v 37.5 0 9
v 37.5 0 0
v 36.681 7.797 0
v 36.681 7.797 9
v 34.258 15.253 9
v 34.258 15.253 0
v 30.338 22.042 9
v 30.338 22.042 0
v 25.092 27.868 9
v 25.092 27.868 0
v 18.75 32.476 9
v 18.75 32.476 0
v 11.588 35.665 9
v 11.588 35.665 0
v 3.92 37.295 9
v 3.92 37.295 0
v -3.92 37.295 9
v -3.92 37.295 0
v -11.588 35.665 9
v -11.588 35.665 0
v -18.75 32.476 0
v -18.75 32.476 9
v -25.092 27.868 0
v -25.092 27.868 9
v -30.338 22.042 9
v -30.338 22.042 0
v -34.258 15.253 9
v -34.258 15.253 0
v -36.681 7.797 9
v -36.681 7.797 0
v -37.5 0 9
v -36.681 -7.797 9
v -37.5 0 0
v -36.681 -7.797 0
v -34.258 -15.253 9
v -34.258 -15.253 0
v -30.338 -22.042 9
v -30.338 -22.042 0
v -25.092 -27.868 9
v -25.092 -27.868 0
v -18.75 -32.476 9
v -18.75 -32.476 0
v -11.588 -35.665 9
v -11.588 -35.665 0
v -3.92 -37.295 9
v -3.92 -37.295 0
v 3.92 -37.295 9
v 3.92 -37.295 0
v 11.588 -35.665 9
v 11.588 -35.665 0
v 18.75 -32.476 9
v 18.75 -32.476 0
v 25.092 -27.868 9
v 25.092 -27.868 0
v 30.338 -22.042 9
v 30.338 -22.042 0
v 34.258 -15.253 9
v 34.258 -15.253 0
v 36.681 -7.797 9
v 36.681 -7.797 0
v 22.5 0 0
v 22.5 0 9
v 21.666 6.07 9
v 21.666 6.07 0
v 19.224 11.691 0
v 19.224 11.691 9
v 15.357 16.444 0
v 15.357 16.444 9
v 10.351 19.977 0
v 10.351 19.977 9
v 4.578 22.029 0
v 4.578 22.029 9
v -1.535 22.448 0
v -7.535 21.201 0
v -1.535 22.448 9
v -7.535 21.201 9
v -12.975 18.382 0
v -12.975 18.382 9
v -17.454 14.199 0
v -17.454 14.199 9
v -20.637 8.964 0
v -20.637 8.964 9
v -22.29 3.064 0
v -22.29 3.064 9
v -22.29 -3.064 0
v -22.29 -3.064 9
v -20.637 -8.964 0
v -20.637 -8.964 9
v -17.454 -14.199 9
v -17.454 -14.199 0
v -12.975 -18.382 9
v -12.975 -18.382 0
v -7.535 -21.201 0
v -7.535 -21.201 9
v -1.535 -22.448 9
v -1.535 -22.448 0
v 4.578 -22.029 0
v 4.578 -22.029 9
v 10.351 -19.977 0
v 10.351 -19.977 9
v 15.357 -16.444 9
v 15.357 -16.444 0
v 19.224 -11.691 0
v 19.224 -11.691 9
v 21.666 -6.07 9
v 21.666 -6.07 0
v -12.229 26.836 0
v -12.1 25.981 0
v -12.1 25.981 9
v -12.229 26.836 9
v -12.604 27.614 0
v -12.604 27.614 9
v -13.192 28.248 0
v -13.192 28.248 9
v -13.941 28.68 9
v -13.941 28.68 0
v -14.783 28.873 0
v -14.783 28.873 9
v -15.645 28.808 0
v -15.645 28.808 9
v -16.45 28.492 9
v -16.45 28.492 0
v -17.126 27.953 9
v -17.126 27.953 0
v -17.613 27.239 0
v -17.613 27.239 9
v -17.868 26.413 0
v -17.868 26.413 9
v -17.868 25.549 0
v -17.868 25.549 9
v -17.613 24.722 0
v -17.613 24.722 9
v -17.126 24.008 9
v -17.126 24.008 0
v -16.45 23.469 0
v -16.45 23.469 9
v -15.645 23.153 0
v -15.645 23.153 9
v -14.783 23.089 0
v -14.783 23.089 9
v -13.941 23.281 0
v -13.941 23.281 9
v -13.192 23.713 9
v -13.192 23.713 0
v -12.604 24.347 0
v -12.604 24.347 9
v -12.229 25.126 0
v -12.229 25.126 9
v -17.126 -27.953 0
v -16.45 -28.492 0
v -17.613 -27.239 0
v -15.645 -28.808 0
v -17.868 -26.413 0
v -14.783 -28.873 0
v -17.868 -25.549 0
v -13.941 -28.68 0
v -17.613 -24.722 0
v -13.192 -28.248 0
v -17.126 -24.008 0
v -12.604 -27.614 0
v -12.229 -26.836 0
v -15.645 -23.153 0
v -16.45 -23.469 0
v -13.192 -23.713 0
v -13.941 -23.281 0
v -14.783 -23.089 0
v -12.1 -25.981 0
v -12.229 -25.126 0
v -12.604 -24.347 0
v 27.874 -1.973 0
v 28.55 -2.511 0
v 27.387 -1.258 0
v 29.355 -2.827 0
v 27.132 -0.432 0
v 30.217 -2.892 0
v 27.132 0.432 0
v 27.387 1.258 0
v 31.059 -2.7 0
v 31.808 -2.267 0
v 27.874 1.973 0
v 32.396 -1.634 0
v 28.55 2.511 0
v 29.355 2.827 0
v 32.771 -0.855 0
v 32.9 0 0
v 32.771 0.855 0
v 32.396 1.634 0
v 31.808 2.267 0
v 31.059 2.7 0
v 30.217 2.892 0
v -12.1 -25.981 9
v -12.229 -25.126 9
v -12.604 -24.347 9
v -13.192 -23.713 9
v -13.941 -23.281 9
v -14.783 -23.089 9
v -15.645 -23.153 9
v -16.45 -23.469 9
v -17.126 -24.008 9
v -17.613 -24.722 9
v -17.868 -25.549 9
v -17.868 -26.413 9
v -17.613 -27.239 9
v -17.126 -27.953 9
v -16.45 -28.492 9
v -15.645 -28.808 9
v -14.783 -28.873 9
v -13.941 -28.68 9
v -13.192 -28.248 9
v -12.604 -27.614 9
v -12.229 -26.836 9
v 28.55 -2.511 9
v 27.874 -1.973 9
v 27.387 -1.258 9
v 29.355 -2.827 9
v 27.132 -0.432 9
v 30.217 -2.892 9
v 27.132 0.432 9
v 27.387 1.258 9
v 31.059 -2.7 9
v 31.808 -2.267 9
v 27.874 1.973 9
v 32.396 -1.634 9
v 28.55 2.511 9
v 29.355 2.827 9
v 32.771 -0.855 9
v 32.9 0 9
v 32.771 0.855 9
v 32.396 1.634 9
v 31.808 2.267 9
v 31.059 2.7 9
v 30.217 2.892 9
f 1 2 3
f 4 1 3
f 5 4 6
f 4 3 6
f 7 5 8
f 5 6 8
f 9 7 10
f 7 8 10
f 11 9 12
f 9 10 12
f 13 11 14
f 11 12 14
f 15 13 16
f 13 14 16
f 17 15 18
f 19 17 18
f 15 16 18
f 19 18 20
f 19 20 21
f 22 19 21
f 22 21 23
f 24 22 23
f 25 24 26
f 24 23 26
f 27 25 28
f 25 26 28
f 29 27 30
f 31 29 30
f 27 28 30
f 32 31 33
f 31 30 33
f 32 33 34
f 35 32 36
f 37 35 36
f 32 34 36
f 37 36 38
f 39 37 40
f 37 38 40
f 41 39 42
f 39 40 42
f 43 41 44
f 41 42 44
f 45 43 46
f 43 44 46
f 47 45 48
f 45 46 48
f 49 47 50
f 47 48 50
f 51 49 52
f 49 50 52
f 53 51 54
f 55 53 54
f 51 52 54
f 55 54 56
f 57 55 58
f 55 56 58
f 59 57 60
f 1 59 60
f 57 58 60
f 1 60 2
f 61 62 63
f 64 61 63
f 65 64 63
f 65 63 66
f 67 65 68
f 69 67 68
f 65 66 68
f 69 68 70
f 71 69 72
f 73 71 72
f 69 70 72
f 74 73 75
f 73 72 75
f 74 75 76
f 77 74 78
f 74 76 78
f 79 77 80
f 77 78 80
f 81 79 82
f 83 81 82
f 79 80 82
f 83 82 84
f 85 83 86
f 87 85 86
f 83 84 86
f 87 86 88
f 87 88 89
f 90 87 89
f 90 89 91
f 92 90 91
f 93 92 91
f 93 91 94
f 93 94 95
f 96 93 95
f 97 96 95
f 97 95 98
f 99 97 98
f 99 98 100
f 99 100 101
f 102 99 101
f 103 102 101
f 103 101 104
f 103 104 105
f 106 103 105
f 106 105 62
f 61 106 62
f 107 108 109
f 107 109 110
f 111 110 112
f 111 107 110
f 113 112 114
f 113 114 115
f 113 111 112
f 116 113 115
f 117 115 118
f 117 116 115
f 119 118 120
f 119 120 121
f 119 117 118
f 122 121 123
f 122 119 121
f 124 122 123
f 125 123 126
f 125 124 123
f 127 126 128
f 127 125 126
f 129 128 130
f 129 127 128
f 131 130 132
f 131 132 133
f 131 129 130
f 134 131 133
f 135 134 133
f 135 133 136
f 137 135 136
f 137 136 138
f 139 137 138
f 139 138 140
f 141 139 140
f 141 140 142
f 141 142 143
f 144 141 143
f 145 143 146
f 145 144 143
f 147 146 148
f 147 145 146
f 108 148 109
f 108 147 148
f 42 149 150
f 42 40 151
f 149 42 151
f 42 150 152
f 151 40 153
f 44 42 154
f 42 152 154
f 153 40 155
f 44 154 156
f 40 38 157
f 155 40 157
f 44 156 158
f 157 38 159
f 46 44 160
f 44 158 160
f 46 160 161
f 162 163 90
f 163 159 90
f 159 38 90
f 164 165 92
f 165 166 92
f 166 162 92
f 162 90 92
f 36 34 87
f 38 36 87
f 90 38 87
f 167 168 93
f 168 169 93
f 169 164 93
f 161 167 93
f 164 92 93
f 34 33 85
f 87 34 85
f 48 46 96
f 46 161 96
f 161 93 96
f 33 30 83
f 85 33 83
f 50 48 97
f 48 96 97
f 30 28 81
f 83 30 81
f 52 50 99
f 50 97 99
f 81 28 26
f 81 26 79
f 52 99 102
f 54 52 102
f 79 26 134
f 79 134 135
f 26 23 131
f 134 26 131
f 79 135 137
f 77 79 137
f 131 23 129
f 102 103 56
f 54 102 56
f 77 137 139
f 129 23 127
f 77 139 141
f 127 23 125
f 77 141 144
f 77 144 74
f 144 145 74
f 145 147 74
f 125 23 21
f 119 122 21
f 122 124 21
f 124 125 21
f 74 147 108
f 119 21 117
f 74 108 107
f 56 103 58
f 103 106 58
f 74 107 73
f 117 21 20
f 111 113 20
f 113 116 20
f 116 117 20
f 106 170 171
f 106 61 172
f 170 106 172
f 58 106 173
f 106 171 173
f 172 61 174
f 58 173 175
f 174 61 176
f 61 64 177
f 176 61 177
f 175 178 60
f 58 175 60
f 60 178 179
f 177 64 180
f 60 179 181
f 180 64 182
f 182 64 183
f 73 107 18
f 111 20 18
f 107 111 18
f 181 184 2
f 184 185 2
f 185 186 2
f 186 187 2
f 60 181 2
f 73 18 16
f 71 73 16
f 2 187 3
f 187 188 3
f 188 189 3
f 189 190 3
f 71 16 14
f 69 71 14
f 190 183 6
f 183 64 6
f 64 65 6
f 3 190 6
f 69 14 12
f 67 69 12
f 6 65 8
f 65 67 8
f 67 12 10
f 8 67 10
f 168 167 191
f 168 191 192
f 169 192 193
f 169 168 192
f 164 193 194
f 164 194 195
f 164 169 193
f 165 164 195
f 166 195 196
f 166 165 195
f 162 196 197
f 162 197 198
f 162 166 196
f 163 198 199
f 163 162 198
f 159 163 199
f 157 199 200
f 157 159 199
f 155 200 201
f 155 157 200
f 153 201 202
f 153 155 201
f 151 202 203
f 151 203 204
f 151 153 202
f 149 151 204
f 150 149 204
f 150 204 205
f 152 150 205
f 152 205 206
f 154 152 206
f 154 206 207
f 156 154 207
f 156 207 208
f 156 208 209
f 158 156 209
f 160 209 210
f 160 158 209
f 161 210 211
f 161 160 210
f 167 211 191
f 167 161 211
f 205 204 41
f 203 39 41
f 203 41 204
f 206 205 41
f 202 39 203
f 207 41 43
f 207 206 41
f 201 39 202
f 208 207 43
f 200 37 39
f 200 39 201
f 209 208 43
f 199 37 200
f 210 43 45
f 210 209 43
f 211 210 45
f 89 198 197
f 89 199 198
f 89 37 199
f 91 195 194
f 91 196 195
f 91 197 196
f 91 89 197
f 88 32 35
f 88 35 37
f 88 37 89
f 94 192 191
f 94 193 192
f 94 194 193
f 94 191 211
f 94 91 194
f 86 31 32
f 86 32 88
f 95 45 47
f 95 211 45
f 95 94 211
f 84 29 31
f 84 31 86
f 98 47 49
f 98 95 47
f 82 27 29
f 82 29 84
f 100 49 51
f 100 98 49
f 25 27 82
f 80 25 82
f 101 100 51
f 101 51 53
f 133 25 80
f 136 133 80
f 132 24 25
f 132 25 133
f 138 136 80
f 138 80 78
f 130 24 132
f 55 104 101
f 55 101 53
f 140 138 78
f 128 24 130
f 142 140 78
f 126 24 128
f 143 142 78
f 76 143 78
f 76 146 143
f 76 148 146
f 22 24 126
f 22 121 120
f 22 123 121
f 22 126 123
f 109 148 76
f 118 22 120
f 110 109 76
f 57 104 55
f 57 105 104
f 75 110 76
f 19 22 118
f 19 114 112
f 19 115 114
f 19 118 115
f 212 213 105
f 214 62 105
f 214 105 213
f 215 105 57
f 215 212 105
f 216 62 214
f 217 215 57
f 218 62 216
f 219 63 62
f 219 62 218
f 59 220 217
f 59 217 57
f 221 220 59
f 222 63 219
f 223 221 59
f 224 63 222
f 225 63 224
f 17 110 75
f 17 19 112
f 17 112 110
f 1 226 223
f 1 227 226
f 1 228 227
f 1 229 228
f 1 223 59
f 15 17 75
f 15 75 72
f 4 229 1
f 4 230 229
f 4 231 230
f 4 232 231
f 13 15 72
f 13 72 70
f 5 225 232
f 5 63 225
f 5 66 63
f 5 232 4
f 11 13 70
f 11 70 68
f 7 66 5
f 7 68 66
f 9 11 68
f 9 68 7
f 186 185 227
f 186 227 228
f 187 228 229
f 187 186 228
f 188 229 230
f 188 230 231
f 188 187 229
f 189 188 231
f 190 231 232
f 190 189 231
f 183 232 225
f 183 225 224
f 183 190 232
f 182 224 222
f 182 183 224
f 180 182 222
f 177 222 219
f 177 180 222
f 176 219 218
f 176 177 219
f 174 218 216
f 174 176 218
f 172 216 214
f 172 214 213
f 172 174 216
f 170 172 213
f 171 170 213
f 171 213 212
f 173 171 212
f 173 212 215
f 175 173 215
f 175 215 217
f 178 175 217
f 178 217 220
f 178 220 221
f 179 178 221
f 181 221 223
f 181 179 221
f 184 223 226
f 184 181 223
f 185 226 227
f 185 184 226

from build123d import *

# Parameters (mm, degrees)
ESQUISSE1_R              = 37.5
BOSS_EXTRU_1_DEPTH       = 9
ESQUISSE2_R              = 22.5
ENL_V_MAT_EXTRU_1_DEPTH  = 30.5
D_GAGEMENT_M51_OUTLINE_R = 2.9
D_GAGEMENT_M51_DEPTH     = 9


# Read off the part's stored shape, not the designer's step: Dégagement M51
with BuildPart() as part:
    # Esquisse1 → Boss.-Extru.1 (new body)
    with BuildSketch(Plane.XY):
        Circle(ESQUISSE1_R)
    extrude(amount=BOSS_EXTRU_1_DEPTH)

    # Esquisse2 → Enlèv. mat.-Extru.1 (cut)
    with BuildSketch(Plane.XY.offset(9)):
        Circle(ESQUISSE2_R)
    extrude(amount=-ENL_V_MAT_EXTRU_1_DEPTH, mode=Mode.SUBTRACT)

    # Dégagement M51 outline → Dégagement M51 (cut)
    with BuildSketch(Plane.XY):
        with Locations((-15, -25.980762114)):
            Circle(D_GAGEMENT_M51_OUTLINE_R)
        with Locations((-15, 25.980762114)):
            Circle(D_GAGEMENT_M51_OUTLINE_R)
        with Locations((30, 0)):
            Circle(D_GAGEMENT_M51_OUTLINE_R)
    extrude(amount=D_GAGEMENT_M51_DEPTH, mode=Mode.SUBTRACT)


solid = part.part
